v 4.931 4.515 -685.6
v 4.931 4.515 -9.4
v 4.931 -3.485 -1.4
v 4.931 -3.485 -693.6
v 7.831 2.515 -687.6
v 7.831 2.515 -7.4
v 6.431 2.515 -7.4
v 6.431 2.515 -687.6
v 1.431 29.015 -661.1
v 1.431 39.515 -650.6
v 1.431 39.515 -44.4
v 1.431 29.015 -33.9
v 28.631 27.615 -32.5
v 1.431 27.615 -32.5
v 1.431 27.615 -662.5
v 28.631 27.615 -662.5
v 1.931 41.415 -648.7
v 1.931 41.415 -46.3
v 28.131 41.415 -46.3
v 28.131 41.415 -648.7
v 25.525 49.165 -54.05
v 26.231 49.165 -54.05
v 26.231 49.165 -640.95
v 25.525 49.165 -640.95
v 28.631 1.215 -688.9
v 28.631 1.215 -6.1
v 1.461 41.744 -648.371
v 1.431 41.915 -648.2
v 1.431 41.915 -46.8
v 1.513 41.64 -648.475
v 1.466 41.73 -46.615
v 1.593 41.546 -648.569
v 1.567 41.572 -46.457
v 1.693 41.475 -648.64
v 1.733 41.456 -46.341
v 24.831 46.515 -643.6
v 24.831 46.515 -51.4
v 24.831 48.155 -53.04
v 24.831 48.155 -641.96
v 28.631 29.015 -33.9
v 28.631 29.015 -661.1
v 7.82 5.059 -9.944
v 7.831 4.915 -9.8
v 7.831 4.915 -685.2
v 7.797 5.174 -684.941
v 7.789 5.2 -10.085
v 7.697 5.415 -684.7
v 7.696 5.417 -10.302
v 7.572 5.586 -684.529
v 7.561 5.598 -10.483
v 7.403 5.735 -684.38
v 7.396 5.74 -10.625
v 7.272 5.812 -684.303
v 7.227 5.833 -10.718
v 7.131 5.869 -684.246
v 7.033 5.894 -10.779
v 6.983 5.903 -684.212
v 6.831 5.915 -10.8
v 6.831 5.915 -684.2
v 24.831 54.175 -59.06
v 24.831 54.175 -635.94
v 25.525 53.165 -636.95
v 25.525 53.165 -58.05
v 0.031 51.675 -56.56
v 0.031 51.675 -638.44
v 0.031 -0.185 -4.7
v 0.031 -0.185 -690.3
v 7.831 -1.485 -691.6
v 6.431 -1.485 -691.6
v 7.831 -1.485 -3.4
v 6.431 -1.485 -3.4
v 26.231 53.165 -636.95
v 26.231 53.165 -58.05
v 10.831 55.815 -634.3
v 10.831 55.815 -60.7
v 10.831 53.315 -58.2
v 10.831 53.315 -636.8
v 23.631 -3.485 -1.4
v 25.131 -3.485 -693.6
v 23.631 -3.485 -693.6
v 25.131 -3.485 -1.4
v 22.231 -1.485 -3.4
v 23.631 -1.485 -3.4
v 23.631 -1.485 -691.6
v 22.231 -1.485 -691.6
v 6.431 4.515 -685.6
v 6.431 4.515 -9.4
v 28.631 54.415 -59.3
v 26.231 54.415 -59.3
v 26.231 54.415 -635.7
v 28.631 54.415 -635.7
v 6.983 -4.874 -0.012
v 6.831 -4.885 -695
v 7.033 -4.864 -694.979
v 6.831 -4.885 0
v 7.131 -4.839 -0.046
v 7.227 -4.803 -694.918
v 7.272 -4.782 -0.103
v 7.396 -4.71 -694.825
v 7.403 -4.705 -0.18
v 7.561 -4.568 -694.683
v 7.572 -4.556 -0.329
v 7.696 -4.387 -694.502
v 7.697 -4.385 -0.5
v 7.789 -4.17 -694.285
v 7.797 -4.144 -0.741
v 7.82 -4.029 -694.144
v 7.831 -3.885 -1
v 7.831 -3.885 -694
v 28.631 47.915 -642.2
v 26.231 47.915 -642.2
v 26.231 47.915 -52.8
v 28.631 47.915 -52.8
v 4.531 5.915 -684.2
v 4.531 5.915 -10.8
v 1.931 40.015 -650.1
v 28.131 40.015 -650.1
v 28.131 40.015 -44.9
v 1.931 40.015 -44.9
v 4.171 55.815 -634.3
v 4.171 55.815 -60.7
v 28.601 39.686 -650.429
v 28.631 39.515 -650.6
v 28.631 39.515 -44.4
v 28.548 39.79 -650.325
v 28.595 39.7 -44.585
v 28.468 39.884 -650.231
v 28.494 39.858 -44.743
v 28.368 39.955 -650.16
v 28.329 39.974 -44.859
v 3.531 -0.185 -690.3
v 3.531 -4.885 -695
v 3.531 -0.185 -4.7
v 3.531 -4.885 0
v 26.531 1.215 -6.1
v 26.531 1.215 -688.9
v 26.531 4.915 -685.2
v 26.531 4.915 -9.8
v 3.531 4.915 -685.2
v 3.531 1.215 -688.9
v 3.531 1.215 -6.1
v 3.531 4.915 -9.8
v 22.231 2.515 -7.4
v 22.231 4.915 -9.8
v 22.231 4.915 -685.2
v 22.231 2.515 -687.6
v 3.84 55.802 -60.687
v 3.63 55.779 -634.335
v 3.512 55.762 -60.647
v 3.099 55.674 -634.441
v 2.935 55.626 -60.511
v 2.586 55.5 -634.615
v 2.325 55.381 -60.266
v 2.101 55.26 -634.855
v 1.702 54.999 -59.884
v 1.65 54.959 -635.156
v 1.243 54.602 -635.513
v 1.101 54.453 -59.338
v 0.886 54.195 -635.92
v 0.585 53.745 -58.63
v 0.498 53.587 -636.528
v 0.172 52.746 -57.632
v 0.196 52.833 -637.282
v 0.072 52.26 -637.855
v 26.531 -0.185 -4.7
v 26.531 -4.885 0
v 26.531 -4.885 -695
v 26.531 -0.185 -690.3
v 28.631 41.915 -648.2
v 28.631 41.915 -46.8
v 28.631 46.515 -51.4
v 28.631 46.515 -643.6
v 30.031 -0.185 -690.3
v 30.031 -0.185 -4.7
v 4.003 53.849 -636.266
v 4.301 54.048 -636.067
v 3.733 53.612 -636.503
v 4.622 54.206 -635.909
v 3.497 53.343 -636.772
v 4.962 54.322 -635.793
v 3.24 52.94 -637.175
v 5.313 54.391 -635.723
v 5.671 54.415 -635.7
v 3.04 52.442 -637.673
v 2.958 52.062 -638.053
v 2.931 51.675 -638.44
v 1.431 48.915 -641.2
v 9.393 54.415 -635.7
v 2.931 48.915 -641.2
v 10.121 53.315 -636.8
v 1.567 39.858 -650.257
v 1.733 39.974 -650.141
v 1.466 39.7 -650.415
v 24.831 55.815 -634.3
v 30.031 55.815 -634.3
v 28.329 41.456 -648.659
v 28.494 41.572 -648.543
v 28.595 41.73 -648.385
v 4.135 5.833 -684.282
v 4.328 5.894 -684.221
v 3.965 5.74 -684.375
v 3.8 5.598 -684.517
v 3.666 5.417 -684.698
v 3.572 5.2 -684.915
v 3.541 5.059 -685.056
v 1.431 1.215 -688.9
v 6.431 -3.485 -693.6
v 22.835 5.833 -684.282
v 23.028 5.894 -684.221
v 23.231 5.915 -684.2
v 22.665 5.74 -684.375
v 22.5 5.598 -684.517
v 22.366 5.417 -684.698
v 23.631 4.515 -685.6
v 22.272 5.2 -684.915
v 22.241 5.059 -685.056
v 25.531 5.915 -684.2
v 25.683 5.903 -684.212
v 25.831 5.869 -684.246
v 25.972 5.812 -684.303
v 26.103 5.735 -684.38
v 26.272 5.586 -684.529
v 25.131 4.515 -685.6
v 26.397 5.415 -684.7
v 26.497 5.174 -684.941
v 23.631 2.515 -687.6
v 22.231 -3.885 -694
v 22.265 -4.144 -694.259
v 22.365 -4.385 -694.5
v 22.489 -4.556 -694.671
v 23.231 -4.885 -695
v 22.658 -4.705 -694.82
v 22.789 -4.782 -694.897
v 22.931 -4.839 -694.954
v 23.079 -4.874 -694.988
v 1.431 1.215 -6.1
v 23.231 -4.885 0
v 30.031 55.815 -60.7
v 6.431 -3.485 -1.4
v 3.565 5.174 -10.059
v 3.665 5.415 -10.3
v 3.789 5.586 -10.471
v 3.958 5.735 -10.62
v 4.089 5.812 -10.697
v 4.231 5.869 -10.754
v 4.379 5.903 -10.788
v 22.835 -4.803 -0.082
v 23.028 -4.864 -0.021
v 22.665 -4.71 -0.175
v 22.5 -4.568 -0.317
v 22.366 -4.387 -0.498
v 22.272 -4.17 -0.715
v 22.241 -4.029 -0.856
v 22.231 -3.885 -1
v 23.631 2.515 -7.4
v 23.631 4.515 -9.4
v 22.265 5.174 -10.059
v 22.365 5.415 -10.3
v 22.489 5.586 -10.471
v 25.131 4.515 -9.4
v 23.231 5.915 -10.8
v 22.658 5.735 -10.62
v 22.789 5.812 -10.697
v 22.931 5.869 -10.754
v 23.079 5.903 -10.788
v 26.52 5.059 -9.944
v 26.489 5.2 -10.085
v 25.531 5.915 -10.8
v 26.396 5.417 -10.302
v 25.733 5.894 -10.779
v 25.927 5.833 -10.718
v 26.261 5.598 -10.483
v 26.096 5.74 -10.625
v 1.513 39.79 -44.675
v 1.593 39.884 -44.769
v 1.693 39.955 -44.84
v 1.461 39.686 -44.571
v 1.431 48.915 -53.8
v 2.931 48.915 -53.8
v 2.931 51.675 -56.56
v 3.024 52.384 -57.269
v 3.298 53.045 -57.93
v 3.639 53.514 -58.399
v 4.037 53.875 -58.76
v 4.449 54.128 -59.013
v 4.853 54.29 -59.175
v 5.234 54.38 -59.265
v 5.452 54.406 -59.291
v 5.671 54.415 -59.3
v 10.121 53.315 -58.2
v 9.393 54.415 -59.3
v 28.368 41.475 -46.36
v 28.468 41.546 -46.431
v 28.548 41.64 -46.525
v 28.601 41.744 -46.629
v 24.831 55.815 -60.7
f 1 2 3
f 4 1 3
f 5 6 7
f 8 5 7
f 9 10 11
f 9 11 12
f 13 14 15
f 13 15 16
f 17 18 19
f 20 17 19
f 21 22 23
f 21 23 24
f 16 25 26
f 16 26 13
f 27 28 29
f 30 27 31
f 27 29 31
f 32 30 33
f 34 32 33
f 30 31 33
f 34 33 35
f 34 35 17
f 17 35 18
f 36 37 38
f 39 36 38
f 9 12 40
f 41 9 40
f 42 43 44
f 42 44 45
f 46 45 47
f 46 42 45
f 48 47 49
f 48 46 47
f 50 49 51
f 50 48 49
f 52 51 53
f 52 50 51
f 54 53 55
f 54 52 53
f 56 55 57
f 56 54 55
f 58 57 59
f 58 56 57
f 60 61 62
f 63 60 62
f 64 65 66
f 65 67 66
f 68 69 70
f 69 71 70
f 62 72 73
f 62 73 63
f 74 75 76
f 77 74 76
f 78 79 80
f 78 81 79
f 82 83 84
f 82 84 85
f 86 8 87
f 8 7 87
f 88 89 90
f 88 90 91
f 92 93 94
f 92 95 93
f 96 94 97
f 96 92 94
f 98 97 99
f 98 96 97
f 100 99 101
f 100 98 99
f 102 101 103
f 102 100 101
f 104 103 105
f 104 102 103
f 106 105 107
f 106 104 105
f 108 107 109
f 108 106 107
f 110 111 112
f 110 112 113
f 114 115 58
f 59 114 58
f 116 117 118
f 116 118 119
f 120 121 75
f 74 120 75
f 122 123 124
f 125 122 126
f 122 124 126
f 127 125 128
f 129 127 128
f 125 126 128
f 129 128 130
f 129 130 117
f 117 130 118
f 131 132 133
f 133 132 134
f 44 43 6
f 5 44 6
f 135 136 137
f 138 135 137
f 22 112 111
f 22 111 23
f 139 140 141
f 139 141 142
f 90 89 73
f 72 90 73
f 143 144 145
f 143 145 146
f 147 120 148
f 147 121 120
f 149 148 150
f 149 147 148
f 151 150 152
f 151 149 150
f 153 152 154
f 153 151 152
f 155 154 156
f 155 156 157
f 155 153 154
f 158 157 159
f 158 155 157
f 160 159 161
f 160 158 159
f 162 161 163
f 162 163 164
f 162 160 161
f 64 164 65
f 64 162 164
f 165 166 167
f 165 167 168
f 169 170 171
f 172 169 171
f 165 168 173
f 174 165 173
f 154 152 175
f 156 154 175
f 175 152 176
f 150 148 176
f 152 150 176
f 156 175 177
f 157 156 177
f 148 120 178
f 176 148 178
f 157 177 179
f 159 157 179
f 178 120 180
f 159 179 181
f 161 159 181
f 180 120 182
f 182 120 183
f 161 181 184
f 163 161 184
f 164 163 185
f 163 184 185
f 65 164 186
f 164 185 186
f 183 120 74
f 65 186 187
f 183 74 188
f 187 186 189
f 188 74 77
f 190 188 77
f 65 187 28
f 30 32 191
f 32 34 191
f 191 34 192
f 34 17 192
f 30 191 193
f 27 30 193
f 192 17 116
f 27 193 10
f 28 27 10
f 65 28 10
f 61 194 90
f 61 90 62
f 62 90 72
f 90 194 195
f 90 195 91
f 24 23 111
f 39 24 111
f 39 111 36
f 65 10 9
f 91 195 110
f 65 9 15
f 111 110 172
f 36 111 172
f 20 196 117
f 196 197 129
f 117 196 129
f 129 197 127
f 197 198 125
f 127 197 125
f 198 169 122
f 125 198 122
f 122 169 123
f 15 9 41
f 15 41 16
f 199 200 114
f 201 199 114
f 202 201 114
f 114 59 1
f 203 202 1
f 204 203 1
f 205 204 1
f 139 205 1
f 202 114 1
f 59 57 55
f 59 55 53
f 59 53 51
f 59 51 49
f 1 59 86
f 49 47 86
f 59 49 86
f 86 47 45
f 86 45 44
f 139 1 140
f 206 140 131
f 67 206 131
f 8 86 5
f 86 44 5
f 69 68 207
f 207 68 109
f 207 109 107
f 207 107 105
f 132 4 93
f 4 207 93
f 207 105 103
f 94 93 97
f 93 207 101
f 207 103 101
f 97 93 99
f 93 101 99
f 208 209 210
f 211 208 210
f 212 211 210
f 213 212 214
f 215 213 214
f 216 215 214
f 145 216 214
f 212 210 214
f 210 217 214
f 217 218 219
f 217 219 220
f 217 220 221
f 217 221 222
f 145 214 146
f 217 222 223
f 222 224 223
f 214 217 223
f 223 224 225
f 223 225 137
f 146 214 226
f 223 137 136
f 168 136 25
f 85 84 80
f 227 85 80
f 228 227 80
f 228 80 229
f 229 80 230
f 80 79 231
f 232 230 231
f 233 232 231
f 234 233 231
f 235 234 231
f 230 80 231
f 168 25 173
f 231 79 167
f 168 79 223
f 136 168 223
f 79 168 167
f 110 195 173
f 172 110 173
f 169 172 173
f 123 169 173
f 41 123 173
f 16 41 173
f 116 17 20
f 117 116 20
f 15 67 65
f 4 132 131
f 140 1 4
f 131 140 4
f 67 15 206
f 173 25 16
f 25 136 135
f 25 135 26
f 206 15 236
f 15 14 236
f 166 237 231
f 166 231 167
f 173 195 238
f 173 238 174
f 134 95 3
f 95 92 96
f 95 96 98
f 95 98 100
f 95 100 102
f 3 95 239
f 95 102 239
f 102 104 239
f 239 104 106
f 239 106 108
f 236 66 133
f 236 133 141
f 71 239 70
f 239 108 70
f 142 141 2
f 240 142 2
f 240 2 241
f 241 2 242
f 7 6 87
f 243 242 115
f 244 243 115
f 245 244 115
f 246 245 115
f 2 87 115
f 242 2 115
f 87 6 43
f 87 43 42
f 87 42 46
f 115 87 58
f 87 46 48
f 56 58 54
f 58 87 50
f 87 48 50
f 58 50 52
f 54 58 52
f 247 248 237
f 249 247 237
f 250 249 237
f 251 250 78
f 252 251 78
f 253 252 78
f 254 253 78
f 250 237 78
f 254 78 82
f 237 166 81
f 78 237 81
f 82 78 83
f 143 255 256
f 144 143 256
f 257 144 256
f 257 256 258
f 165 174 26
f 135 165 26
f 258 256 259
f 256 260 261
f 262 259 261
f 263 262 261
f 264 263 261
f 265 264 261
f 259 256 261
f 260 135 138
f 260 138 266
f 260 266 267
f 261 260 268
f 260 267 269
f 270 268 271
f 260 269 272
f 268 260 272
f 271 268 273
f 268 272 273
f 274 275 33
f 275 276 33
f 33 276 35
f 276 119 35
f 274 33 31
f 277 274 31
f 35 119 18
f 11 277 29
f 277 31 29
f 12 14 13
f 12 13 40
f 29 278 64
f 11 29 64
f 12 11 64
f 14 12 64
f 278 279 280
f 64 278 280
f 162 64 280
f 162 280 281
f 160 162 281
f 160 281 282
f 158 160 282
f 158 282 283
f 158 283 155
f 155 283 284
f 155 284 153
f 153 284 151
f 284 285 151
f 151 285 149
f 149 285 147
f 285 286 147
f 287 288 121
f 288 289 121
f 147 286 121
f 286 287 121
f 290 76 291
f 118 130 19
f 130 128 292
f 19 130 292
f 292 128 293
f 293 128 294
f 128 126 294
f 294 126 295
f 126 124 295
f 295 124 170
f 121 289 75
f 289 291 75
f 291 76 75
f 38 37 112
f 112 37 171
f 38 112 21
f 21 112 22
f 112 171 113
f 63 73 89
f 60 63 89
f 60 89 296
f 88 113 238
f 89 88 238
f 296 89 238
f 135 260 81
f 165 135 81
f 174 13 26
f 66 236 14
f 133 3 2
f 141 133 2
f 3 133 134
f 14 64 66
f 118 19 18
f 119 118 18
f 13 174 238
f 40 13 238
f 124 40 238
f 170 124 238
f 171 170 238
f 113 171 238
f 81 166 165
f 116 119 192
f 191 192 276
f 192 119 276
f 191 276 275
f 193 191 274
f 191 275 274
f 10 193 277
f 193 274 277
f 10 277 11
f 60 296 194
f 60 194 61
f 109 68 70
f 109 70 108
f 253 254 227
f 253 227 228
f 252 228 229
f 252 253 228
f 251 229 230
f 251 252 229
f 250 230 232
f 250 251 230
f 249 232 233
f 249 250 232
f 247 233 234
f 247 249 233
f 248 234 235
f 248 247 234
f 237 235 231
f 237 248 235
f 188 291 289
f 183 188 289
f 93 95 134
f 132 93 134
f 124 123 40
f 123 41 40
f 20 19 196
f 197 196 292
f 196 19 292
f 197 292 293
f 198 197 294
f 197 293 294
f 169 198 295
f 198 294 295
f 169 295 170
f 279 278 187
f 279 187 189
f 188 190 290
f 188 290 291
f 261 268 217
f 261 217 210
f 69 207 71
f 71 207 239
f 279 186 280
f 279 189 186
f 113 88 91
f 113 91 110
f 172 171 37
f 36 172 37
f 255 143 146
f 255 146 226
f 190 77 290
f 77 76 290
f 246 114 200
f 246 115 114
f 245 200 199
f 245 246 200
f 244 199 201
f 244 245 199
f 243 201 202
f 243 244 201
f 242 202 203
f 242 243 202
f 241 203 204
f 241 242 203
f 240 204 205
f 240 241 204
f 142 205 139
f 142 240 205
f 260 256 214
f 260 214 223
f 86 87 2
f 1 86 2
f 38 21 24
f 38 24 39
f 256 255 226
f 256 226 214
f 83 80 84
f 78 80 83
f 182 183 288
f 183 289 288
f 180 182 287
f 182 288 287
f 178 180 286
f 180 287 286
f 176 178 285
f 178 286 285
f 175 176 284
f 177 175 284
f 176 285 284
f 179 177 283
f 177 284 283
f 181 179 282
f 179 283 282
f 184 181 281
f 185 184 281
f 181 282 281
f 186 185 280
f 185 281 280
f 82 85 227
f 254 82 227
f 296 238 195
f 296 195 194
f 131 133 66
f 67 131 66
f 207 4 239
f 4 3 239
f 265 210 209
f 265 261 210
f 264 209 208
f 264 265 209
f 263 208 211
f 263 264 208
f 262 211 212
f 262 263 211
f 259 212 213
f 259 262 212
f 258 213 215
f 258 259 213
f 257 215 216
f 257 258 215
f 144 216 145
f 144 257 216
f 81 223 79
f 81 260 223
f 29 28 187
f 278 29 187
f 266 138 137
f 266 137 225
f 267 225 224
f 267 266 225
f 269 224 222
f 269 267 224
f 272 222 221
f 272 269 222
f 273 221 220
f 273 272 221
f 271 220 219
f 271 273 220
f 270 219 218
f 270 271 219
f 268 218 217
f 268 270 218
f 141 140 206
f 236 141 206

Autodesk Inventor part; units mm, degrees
ref_plane "YZ Plane" through (0, 0, 0) normal (1, 0, 0) x (0, 1, 0)
ref_plane "XZ Plane" through (0, 0, 0) normal (0, 1, 0) x (-1, 0, 0)
sketch "Boceto1" plane through (0, 0, 0) normal (0, 0, 1) x (1, 0, 0)
  line L0 (28.1307, 40.0149) -> (1.9307, 40.0149)
  line L1 (1.9307, 41.4149) -> (28.1307, 41.4149)
  line L2 (0.0307, -0.1851) -> (0.0307, 51.6749)
  line L3 (24.8307, 55.8149) -> (24.8307, 54.1749)
  line L4 (28.6307, 54.4149) -> (28.6307, 47.9149)
  line L5 (28.6307, 46.5149) -> (24.8307, 46.5149)
  line L6 (24.8307, 46.5149) -> (24.8307, 48.1549)
  line L7 (26.2307, 47.9149) -> (28.6307, 47.9149)
  line L8 (26.2307, 49.1649) -> (25.5249, 49.1649)
  line L9 (25.5249, 49.1649) -> (24.8307, 48.1549)
  line L10 (26.2307, 53.1649) -> (25.5249, 53.1649)
  line L11 (1.4307, 41.9149) -> (1.4307, 48.9149)
  line L12 (1.4307, 48.9149) -> (2.9307, 48.9149)
  line L13 (2.9307, 48.9149) -> (2.9307, 51.6749)
  line L14 (4.1707, 55.8149) -> (10.8307, 55.8149)
  line L15 (9.3926, 54.4149) -> (5.6707, 54.4149)
  line L16 (10.8307, 55.8149) -> (10.8307, 53.3149)
  line L17 (10.8307, 53.3149) -> (10.1207, 53.3149)
  line L18 (10.1207, 53.3149) -> (9.3926, 54.4149)
  line L19 (26.2307, 54.4149) -> (28.6307, 54.4149)
  arc A0 (5.6707, 54.4149) -> (2.9307, 51.6749) centre (5.6707, 51.6749) ccw
  arc A1 (4.1707, 55.8149) -> (0.0307, 51.6749) centre (4.1707, 51.6749) ccw
  line L20 (24.8307, 54.1749) -> (25.5249, 53.1649)
  line L21 (26.2307, 54.4149) -> (26.2307, 53.1649)
  line L22 (26.2307, 47.9149) -> (26.2307, 49.1649)
  arc A2 (1.9307, 40.0149) -> (1.4307, 39.5149) centre (1.9307, 39.5149) ccw
  arc A3 (28.6307, 39.5149) -> (28.1307, 40.0149) centre (28.1307, 39.5149) ccw
  arc A4 (28.1307, 41.4149) -> (28.6307, 41.9149) centre (28.1307, 41.9149) ccw
  arc A5 (1.4307, 41.9149) -> (1.9307, 41.4149) centre (1.9307, 41.9149) ccw
  line L23 (30.0307, 55.8149) -> (24.8307, 55.8149)
  line L24 (28.6307, 41.9149) -> (28.6307, 46.5149)
  line L25 (30.0307, 55.8149) -> (30.0307, -0.1851)
  line L26 (1.4307, 29.0149) -> (28.6307, 29.0149)
  line L27 (1.4307, 27.6149) -> (28.6307, 27.6149)
  line L28 (1.4307, 39.5149) -> (1.4307, 29.0149)
  line L29 (1.4307, 27.6149) -> (1.4307, 1.2149)
  line L30 (28.6307, 1.2149) -> (28.6307, 27.6149)
  line L31 (28.6307, 29.0149) -> (28.6307, 39.5149)
  line L32 (28.6307, 39.5149) -> (28.6307, 29.0149)
  line L33 (28.6307, 27.6149) -> (28.6307, 1.2149)
  line L34 (4.5307, 5.9149) -> (6.8307, 5.9149)
  line L35 (7.8307, 4.9149) -> (7.8307, 2.5149)
  line L36 (7.8307, 2.5149) -> (6.4307, 2.5149)
  line L37 (6.4307, 2.5149) -> (6.4307, 4.5149)
  line L38 (6.4307, 4.5149) -> (4.9307, 4.5149)
  line L39 (4.9307, 4.5149) -> (4.9307, -3.4851)
  line L40 (4.9307, -3.4851) -> (6.4307, -3.4851)
  line L41 (6.4307, -3.4851) -> (6.4307, -1.4851)
  line L42 (6.4307, -1.4851) -> (7.8307, -1.4851)
  line L43 (7.8307, -1.4851) -> (7.8307, -3.8851)
  line L44 (6.8307, -4.8851) -> (3.5307, -4.8851)
  line L45 (3.5307, -4.8851) -> (3.5307, -0.1851)
  arc A6 (7.8307, 4.9149) -> (6.8307, 5.9149) centre (6.8307, 4.9149) ccw
  arc A7 (4.5307, 5.9149) -> (3.5307, 4.9149) centre (4.5307, 4.9149) ccw
  arc A8 (6.8307, -4.8851) -> (7.8307, -3.8851) centre (6.8307, -3.8851) ccw
  line L46 (3.5307, 1.2149) -> (1.4307, 1.2149)
  line L47 (3.5307, -0.1851) -> (0.0307, -0.1851)
  line L48 (3.5307, 1.2149) -> (3.5307, 4.9149)
  line L49 (25.5307, 5.9149) -> (23.2307, 5.9149)
  line L50 (22.2307, 4.9149) -> (22.2307, 2.5149)
  line L51 (22.2307, 2.5149) -> (23.6307, 2.5149)
  line L52 (23.6307, 2.5149) -> (23.6307, 4.5149)
  line L53 (23.6307, 4.5149) -> (25.1307, 4.5149)
  line L54 (25.1307, 4.5149) -> (25.1307, -3.4851)
  line L55 (25.1307, -3.4851) -> (23.6307, -3.4851)
  line L56 (23.6307, -3.4851) -> (23.6307, -1.4851)
  line L57 (23.6307, -1.4851) -> (22.2307, -1.4851)
  line L58 (22.2307, -1.4851) -> (22.2307, -3.8851)
  line L59 (23.2307, -4.8851) -> (26.5307, -4.8851)
  line L60 (26.5307, -4.8851) -> (26.5307, -0.1851)
  arc A9 (23.2307, 5.9149) -> (22.2307, 4.9149) centre (23.2307, 4.9149) ccw
  arc A10 (26.5307, 4.9149) -> (25.5307, 5.9149) centre (25.5307, 4.9149) ccw
  arc A11 (22.2307, -3.8851) -> (23.2307, -4.8851) centre (23.2307, -3.8851) ccw
  line L61 (26.5307, 1.2149) -> (28.6307, 1.2149)
  line L62 (26.5307, -0.1851) -> (30.0307, -0.1851)
  line L63 (26.5307, 1.2149) -> (26.5307, 4.9149)
  point P0 (28.6307, 51.1649)
  point P1 (0.0307, 0.7149)
  point P2 (4.9307, 0.5149)
  point P3 (25.1307, 0.5149)
  dimension "d31" = 1.4
  dimension "d42" = 2.5
  dimension "d43" = 0.71
  dimension "d45" = 2.9
  dimension "d47" = 33.5
  dimension "d48" = 7.5
  dimension "d51" = 2.74
  dimension "d59" = 6.9
  dimension "d60" = 1.4
  dimension "d78" = 6.5
  dimension "d84" = 1.4
  dimension "d85" = 1.4
  dimension "d88" = 2.4
  dimension "d95" = 6.02
  dimension "d99" = 111
  dimension "d100" = 2.4
  dimension "d108" = 4
  dimension "d109" = 0.7058
  dimension "d110" = 0.7058
  dimension "d143" = 1.4
  dimension "d147" = 1.4
  dimension "d148" = 30
  dimension "d149" = 1.4
  dimension "d150" = 14
  dimension "d151" = 27.2
  dimension "d152" = 14.4
  dimension "d153" = 1.4
  dimension "d154" = 11
  dimension "d155" = 1.4
  dimension "d156" = 1.4
  dimension "d157" = 1.4
  dimension "d158" = 1.4
  dimension "d162" = 60.7
  dimension "d163" = 10.8
  dimension "d164" = 8
  dimension "d165" = 2
  dimension "d166" = 4
  dimension "d167" = 1.5
  dimension "d168" = 7.8
  dimension "d169" = 1
  dimension "d172" = 1.4
  dimension "d173" = 4.7
  dimension "d175" = 56
  dimension "d176" = 13.8
  dimension "d177" = 14.4
  dimension "d180" = 1.5
  dimension "d181" = 4.14
  dimension "d182" = 10.8
  dimension "d183" = 14.4
  dimension "d184" = 0.5
  dimension "d187" = 3.5
  dimension "d188" = 4.9
  dimension "d189" = 6.4
  dimension "d190" = 7.8
  dimension "d191" = 26.5
  dimension "d193" = 54.6
  dimension "d195" = 3.5
  dimension "d196" = 4.9
  dimension "d197" = 53.9
  dimension "d198" = 53.7
  dimension "d202" = 2
  dimension "d203" = 3.01
  dimension "d204" = 2
  dimension "d205" = 9.3
extrude "Extrusión1" add sketch "Boceto1" against normal blind 695
ref_plane "Plano de trabajo1" through (0, 0, -347.5) normal (0, 0, 1) x (1, 0, 0)
sketch "Boceto2" plane through (30.0307, -0.1851, 0) normal (1, 0, 0) x (0, 0, -1)
  line L0 (0, -4.7) -> (0, 0) projected
  line L1 (0, -4.7) -> (695, -4.7) projected
  line L2 (695, 0) -> (695, -4.7) projected
  line L3 (0, 0) -> (695, 0) projected
  line L4 (0, 0) -> (0, 56) projected
  line L5 (0, 0) -> (695, 0) projected
  line L6 (695, 56) -> (695, 0) projected
  line L7 (0, 56) -> (695, 56) projected
  line L8 (0, -4.7) -> (60.7, 56)
  line L9 (0, 56) -> (60.7, 56)
  line L10 (0, 56) -> (0, -4.7)
  point P0 (0, 0.1851)
  point P1 (0, 0)
  dimension "d201" = 45
extrude "Extrusión2" cut sketch "Boceto2" against normal through all contours L0 L3 L8 | L4 L7 L8 L3
mirror "Simetría1" about plane through (0, 0, -347.5) normal (0, 0, 1) of "Extrusión2"
ref_plane "Plano de trabajo2" through (15.0307, -0.1851, -4.7) normal (1, 0, 0) x (0, 0, -1)
properties part number "SP40-10 HOJA CORREDERA 695 mm" material "Aluminio"
